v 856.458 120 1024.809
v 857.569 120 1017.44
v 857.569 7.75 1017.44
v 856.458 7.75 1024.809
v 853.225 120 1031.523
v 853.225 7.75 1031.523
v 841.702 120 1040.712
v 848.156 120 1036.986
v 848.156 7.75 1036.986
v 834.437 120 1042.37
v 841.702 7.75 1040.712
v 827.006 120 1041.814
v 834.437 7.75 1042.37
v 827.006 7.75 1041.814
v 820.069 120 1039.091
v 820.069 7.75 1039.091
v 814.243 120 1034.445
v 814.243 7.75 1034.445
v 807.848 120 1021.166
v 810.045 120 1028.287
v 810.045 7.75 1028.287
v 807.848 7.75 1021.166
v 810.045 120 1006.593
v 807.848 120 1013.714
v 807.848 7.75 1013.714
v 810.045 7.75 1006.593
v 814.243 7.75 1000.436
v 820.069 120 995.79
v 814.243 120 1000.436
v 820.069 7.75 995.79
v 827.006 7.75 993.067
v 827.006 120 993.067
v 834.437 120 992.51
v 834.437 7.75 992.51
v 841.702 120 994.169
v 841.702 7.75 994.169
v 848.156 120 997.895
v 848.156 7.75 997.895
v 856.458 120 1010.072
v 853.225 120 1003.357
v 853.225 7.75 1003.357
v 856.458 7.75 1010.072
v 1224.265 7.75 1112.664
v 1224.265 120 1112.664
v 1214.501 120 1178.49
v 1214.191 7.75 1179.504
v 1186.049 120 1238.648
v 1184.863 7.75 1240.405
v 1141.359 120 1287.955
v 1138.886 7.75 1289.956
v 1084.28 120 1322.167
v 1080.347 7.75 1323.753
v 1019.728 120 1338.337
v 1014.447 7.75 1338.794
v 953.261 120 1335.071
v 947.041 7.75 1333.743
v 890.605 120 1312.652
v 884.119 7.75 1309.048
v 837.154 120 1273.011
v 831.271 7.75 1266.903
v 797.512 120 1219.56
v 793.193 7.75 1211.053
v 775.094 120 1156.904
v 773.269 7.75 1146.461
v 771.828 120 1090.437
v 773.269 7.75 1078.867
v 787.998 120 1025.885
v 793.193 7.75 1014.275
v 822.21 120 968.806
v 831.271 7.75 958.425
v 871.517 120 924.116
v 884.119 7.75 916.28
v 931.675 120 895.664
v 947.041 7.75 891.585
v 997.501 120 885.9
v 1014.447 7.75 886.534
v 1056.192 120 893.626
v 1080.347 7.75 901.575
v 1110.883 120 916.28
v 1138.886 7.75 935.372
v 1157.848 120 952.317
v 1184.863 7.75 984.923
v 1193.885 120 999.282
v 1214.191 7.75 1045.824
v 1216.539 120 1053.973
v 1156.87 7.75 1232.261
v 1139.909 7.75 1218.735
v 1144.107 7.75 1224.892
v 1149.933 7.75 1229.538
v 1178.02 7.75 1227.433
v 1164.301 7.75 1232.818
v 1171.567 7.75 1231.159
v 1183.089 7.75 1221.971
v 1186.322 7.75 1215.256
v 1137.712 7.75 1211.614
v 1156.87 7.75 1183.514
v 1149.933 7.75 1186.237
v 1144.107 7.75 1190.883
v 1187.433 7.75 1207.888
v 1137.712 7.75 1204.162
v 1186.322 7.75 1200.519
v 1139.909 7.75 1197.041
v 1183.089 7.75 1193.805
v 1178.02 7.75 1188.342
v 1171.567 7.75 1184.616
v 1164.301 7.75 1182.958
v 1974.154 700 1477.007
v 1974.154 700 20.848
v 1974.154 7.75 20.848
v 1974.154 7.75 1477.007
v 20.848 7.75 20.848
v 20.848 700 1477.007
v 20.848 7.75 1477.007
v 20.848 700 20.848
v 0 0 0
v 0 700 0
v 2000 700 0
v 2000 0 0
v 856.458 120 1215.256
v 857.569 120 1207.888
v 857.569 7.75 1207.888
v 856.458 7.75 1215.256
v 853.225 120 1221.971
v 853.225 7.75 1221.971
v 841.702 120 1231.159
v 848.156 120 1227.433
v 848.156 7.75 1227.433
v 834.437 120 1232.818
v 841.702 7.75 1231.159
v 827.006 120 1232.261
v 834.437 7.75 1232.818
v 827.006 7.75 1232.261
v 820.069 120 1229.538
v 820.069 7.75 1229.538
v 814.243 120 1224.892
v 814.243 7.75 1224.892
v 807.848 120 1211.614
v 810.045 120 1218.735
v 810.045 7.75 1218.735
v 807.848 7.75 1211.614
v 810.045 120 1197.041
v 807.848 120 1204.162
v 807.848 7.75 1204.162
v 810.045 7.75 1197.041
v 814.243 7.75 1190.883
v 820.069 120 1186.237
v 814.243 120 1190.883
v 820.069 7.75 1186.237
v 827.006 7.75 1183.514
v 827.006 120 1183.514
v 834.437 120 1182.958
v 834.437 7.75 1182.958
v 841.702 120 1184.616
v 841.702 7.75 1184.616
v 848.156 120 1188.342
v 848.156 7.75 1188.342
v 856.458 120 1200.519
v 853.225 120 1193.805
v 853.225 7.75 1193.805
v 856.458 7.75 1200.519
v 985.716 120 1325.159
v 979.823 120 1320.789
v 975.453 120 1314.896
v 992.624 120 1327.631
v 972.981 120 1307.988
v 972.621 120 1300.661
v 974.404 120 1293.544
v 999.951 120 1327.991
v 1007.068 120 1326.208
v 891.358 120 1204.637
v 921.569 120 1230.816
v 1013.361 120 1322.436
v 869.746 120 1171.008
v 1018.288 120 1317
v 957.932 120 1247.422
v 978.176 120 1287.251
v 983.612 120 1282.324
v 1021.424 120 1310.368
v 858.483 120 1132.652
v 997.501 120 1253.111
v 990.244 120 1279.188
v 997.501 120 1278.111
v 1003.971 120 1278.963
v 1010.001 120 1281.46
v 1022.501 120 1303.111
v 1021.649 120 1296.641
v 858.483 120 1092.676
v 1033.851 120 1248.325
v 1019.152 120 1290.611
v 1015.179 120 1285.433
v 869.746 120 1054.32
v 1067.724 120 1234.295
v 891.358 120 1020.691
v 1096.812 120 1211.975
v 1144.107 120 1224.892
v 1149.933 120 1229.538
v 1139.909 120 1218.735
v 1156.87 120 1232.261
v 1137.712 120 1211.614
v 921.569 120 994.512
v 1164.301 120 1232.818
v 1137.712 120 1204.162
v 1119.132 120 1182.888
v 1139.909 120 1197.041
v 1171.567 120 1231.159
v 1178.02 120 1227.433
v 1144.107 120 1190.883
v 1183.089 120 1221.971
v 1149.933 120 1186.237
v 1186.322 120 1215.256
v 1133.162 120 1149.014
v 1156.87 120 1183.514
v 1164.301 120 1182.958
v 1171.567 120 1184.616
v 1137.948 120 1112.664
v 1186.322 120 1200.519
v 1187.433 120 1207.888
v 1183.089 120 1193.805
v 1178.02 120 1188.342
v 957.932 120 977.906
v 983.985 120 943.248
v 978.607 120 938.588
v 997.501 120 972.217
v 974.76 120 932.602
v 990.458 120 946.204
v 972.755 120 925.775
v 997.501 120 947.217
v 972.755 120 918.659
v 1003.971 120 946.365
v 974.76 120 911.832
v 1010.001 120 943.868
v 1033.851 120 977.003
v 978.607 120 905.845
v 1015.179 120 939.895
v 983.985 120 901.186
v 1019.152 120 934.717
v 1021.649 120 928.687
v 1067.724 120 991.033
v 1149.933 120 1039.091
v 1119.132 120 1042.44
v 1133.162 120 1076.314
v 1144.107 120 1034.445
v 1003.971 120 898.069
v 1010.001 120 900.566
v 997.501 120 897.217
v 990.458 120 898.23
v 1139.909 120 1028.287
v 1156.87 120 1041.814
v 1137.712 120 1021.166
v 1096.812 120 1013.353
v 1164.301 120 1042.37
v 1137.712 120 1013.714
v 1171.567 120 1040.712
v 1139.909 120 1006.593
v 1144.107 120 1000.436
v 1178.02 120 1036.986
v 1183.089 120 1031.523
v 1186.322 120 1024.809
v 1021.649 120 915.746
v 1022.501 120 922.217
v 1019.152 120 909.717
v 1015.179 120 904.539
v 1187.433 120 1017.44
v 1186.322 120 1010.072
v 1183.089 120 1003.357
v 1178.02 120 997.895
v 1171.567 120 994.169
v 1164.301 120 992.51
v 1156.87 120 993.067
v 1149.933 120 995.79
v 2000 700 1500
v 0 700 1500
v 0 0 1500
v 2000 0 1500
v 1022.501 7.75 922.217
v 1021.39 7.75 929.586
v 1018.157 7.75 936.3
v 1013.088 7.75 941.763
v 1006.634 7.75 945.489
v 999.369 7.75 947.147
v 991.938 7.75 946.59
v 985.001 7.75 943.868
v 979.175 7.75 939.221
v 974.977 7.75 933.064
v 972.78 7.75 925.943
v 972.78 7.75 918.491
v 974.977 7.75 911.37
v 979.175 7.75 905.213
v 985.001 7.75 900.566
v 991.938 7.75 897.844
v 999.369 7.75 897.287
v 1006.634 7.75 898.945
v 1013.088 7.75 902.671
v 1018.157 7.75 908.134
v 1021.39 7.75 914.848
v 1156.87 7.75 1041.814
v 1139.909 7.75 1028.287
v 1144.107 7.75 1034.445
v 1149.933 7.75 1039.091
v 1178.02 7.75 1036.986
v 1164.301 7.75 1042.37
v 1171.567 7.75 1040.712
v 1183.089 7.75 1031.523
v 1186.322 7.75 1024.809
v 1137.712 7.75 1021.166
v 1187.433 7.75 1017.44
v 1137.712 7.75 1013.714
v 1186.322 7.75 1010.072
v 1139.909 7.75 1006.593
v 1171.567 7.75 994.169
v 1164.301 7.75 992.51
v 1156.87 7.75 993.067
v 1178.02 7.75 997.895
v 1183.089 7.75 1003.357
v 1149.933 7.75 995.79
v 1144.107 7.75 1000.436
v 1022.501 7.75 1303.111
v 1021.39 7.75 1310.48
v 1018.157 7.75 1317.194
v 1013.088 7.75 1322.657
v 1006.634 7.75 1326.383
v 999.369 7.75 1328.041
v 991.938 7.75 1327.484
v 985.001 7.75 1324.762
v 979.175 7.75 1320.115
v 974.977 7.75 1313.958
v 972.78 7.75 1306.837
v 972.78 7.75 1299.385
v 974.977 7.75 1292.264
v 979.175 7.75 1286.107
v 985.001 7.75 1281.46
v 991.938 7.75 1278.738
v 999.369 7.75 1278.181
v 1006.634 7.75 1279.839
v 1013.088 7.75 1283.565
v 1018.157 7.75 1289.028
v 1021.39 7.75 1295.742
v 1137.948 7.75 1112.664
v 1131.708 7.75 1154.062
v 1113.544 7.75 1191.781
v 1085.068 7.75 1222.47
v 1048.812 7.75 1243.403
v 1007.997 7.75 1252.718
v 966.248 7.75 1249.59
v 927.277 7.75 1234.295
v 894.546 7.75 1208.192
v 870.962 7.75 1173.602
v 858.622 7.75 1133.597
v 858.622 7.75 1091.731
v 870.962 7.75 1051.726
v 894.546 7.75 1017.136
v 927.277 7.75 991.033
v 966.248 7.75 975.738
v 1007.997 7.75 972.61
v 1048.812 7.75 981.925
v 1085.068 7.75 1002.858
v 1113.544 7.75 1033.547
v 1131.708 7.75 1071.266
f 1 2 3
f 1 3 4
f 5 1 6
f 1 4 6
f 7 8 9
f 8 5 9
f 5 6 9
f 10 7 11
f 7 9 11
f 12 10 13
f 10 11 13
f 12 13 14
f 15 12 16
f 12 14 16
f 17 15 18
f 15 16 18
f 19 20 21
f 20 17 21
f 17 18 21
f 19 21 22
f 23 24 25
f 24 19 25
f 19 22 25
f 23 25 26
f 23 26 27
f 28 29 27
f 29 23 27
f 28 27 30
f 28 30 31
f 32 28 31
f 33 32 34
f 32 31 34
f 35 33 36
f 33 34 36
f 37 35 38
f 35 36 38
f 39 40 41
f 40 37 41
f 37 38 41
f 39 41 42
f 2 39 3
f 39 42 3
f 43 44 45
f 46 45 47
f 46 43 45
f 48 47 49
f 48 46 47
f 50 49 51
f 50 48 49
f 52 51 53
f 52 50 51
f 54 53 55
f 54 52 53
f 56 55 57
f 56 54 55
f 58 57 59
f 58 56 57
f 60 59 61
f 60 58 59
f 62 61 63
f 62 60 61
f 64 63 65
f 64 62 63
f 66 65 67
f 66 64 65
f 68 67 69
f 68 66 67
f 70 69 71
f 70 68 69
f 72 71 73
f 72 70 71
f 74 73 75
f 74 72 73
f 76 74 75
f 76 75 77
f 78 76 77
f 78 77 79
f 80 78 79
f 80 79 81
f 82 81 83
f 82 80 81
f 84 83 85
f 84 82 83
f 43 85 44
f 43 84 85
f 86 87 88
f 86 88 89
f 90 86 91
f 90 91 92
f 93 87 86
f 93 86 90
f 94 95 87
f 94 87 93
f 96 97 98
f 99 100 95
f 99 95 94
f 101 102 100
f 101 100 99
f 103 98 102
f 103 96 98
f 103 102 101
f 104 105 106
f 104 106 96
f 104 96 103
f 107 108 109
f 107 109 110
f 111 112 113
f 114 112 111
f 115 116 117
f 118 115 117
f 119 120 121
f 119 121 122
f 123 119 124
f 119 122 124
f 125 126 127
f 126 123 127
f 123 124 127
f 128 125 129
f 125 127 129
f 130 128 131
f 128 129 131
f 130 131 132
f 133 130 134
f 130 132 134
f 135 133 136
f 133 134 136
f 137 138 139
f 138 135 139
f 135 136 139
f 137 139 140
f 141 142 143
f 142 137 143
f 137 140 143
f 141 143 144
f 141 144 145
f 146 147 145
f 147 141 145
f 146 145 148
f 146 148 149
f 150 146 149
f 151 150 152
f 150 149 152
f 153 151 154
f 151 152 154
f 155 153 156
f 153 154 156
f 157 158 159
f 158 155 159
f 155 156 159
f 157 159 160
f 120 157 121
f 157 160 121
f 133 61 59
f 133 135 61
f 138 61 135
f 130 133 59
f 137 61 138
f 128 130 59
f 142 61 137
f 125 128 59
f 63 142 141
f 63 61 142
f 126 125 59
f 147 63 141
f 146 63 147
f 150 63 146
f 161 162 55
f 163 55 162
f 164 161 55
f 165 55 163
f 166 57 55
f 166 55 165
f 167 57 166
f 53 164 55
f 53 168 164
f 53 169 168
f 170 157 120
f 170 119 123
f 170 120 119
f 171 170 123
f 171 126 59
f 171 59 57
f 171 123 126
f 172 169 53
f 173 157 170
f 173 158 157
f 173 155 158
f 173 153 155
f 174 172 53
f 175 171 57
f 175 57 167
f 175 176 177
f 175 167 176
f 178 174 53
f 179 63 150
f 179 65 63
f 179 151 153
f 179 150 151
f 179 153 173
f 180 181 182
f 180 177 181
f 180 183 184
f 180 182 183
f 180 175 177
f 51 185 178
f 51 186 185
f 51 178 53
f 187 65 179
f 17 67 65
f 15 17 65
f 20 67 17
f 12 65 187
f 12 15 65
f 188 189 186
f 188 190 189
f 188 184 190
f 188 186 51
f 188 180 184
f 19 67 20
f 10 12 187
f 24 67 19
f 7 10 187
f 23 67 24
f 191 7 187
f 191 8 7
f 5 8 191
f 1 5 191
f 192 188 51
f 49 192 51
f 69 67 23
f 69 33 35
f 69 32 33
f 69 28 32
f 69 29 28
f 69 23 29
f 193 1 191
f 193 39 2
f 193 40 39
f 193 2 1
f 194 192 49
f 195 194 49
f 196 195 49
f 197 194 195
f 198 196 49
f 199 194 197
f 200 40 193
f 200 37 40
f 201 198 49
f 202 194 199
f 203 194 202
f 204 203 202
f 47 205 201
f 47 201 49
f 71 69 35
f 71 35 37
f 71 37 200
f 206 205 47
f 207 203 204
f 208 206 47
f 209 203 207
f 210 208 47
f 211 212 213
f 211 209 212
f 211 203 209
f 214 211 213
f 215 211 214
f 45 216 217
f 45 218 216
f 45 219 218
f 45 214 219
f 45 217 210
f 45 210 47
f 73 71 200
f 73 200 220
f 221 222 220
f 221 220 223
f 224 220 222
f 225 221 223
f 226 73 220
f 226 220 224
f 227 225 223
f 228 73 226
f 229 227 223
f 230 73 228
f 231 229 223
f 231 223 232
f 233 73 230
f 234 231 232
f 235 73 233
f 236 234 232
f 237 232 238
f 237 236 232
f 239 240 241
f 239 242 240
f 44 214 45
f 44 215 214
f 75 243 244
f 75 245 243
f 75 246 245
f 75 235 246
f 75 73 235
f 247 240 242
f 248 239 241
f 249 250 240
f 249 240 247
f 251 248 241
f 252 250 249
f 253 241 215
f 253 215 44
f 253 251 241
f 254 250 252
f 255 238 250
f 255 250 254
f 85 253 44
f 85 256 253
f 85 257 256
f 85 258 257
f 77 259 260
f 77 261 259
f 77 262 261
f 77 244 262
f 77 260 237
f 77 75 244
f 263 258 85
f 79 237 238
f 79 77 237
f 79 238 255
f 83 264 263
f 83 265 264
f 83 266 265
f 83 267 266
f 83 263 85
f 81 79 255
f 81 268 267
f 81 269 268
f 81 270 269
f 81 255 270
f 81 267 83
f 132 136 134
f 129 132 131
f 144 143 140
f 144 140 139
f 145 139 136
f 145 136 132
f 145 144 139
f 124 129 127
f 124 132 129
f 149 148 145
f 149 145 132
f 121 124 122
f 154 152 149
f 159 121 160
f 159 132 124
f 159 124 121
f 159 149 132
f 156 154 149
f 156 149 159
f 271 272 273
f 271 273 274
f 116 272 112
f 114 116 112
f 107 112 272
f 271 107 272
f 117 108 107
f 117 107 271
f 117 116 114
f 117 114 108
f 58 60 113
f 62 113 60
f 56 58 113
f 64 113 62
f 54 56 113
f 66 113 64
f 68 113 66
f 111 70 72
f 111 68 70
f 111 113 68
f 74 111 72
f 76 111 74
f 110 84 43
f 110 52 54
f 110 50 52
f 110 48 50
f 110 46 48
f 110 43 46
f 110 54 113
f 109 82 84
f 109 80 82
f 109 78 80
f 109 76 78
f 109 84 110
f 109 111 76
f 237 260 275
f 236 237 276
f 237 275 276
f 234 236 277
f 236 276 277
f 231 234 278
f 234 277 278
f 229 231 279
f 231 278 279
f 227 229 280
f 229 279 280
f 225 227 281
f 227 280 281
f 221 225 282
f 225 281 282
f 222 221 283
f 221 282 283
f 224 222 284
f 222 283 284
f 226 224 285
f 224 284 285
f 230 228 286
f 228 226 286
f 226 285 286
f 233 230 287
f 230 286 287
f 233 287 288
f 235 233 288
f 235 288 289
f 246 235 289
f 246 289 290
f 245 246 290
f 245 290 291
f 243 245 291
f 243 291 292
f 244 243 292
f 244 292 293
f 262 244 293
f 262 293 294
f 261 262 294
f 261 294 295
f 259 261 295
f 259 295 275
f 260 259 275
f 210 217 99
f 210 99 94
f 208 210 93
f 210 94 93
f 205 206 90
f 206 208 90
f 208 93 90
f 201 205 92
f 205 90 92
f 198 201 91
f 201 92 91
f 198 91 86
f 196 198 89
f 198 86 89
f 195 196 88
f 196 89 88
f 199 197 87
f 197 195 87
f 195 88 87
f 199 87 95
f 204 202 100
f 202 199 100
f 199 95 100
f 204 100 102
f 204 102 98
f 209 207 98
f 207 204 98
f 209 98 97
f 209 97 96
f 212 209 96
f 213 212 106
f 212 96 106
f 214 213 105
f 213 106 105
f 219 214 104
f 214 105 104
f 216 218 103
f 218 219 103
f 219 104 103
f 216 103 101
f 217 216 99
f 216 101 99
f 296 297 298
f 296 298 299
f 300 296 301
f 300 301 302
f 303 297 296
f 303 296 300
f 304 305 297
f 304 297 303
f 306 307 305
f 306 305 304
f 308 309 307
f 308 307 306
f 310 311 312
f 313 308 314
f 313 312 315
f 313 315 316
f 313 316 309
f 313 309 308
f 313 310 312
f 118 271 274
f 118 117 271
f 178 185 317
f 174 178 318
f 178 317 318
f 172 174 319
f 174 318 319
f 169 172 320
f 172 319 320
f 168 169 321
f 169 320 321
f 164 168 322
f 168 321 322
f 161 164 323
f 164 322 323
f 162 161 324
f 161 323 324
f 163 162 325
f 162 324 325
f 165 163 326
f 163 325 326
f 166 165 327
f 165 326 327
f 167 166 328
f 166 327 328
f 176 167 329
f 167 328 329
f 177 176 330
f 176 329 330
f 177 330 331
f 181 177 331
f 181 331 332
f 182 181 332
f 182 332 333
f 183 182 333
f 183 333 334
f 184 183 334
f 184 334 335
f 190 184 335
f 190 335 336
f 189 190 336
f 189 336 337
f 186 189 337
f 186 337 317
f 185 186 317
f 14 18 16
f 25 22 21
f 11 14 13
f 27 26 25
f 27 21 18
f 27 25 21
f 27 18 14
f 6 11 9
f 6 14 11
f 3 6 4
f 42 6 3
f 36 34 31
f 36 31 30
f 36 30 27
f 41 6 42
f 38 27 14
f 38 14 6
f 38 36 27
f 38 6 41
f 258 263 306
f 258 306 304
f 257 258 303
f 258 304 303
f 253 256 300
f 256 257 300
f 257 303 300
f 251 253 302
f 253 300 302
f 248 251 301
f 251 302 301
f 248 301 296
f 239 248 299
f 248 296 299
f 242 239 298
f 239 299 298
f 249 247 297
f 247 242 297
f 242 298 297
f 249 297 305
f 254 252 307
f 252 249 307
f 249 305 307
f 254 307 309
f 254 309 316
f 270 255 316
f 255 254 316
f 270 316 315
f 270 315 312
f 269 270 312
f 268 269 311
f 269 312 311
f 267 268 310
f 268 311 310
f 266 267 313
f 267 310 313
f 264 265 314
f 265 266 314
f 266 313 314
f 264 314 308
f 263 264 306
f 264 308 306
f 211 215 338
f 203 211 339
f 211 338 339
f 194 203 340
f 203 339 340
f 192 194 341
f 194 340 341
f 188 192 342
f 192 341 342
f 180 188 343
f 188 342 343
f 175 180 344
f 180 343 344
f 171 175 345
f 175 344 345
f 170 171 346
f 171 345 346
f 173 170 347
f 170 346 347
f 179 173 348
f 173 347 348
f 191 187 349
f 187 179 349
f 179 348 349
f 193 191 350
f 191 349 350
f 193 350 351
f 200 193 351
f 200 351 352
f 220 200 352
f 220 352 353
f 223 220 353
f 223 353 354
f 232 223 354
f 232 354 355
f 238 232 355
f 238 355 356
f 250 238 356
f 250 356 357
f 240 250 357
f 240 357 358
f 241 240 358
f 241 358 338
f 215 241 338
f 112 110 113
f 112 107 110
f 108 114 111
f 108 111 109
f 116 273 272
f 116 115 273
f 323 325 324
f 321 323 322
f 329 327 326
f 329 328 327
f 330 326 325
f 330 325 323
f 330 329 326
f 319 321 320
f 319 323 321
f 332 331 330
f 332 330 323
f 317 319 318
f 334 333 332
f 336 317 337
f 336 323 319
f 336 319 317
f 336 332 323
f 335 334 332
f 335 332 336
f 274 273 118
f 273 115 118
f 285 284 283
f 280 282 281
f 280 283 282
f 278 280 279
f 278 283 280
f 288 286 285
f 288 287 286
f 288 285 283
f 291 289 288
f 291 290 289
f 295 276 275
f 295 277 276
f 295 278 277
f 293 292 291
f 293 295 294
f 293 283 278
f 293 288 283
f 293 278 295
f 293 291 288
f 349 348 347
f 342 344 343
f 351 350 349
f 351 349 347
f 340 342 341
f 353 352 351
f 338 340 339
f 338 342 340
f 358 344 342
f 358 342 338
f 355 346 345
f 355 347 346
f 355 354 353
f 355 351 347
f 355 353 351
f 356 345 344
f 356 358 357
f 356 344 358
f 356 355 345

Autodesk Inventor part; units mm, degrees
ref_plane "YZ Plane" through (0, 0, 0) normal (1, 0, 0) x (0, 1, 0)
ref_plane "XZ Plane" through (0, 0, 0) normal (0, 1, 0) x (-1, 0, 0)
ref_plane "XY Plane" through (0, 0, 0) normal (0, 0, 1) x (1, 0, 0)
sketch "Sketch1" plane through (0, 0, 0) normal (0, 0, 1) x (1, 0, 0)
  line L0 (0, 0) -> (0, 700)
  line L1 (0, 0) -> (2000, 0)
  line L2 (0, 700) -> (2000, 700)
  line L3 (2000, 700) -> (2000, 0)
  line L4 (2000, 0) -> (0, 0)
  line L5 (0, 0) -> (0, 700)
  dimension "d0" = 700
  dimension "d1" = 2000
extrude "Extrusion1" add sketch "Sketch1" along normal blind 1500
sketch "Sketch2" plane through (0, 700, 0) normal (0, 1, 0) x (1, 0, 0)
  line L0 (1974.1538, -1477.007) -> (20.8481, -1477.007)
  line L1 (20.8481, -1477.007) -> (20.8481, -20.8481)
  line L2 (20.8481, -20.8481) -> (1974.1538, -20.8481)
  line L3 (1974.1538, -20.8481) -> (1974.1538, -1477.007)
  point P0 (0, 0)
extrude "Extrusion2" cut sketch "Sketch2" against normal blind 692.25
sketch "Sketch3" plane through (0, 7.75, 0) normal (0, 1, 0) x (1, 0, 0)
  line L0 (1974.1538, -20.8481) -> (1974.1538, -1477.007) projected
  line L1 (20.8481, -20.8481) -> (1974.1538, -20.8481) projected
  line L2 (1974.1538, -1477.007) -> (20.8481, -20.8481)
  line L3 (1974.1538, -1477.007) -> (20.8481, -1477.007) projected
  line L4 (20.8481, -1477.007) -> (1974.1538, -20.8481)
  line L5 (997.5009, -748.9276) -> (997.5009, -1112.664)
  circle A0 centre (997.5009, -1112.664) radius 140.4471
  line L6 (997.5009, -1253.1111) -> (997.5009, -1303.1111)
  circle A1 centre (997.5009, -1303.1111) radius 25
  circle A2 centre (832.5689, -1207.8876) radius 25
  circle A3 centre (832.5689, -1017.4404) radius 25
  circle A4 centre (997.5009, -922.2169) radius 25
  circle A5 centre (1162.433, -1017.4404) radius 25
  circle A6 centre (1162.433, -1207.8876) radius 25
  circle A7 centre (997.5009, -1112.664) radius 226.7645
  circle A8 centre (997.5009, -1112.664) radius 226.7645
  point P0 (0, 0)
  dimension "d9" = 50
  dimension "d11" = 50
  dimension "d14" = 360
extrude "Extrusion3" add sketch "Sketch3" along normal blind 112.25 contours A7
properties part number "Robot Volume and wall" material "Wood (Birch)"
